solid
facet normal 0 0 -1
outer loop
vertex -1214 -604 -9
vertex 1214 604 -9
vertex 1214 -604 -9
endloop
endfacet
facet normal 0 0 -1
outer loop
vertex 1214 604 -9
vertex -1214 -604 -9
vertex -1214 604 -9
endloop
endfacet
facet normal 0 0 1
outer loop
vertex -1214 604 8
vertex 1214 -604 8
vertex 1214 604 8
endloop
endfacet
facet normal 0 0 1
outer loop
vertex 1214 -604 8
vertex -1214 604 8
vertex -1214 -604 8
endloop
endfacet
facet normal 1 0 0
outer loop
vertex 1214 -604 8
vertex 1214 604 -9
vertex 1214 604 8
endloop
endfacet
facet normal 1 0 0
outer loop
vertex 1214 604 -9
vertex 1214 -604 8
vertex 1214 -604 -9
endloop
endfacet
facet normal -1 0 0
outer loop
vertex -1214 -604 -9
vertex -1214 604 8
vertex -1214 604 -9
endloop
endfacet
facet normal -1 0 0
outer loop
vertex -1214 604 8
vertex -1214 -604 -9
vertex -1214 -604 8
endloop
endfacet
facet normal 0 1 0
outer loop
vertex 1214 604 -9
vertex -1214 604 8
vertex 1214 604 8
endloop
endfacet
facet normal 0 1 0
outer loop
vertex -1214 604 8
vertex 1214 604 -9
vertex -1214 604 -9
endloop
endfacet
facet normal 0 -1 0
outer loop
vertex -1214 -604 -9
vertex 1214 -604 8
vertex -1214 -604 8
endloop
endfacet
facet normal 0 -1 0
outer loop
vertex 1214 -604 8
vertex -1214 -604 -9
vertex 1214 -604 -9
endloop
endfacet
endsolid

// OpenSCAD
// Parameters
sheet_length = 2440; //[1220:4880:10]
sheet_width = 1220; //[610:2440:10]
sheet_thickness = 18; //[9:36:1]
corner_radius = 6; //[0:30:1]
edge_chamfer = 1; //[0:5:0.5]
overlap = 1; //[0.5:2:0.5]

// Base Shapes
module mdf_sheet_body() {
  cube([sheet_length, sheet_width, sheet_thickness], center=true);
}

module edge_chamfer_shape() {
  translate([0, 0, sheet_thickness/2 - edge_chamfer/2])
    cube([sheet_length + 2*overlap, sheet_width + 2*overlap, edge_chamfer], center=true);
}

module corner_radius_shape() {
  cube([sheet_length - 2*corner_radius, sheet_width - 2*corner_radius, sheet_thickness + 2*overlap], center=true);
}

// Operations
module sheet_with_edge_chamfer() {
  difference() {
    mdf_sheet_body();
    edge_chamfer_shape();
  }
}

module sheet_with_corner_radius() {
  intersection() {
    sheet_with_edge_chamfer();
    corner_radius_shape();
  }
}

// Final Model
module final_model() {
  union() {
    sheet_with_corner_radius();
  }
}

// Render the final model
color([0.85, 0.85, 0.8]) // MDF color
final_model();
